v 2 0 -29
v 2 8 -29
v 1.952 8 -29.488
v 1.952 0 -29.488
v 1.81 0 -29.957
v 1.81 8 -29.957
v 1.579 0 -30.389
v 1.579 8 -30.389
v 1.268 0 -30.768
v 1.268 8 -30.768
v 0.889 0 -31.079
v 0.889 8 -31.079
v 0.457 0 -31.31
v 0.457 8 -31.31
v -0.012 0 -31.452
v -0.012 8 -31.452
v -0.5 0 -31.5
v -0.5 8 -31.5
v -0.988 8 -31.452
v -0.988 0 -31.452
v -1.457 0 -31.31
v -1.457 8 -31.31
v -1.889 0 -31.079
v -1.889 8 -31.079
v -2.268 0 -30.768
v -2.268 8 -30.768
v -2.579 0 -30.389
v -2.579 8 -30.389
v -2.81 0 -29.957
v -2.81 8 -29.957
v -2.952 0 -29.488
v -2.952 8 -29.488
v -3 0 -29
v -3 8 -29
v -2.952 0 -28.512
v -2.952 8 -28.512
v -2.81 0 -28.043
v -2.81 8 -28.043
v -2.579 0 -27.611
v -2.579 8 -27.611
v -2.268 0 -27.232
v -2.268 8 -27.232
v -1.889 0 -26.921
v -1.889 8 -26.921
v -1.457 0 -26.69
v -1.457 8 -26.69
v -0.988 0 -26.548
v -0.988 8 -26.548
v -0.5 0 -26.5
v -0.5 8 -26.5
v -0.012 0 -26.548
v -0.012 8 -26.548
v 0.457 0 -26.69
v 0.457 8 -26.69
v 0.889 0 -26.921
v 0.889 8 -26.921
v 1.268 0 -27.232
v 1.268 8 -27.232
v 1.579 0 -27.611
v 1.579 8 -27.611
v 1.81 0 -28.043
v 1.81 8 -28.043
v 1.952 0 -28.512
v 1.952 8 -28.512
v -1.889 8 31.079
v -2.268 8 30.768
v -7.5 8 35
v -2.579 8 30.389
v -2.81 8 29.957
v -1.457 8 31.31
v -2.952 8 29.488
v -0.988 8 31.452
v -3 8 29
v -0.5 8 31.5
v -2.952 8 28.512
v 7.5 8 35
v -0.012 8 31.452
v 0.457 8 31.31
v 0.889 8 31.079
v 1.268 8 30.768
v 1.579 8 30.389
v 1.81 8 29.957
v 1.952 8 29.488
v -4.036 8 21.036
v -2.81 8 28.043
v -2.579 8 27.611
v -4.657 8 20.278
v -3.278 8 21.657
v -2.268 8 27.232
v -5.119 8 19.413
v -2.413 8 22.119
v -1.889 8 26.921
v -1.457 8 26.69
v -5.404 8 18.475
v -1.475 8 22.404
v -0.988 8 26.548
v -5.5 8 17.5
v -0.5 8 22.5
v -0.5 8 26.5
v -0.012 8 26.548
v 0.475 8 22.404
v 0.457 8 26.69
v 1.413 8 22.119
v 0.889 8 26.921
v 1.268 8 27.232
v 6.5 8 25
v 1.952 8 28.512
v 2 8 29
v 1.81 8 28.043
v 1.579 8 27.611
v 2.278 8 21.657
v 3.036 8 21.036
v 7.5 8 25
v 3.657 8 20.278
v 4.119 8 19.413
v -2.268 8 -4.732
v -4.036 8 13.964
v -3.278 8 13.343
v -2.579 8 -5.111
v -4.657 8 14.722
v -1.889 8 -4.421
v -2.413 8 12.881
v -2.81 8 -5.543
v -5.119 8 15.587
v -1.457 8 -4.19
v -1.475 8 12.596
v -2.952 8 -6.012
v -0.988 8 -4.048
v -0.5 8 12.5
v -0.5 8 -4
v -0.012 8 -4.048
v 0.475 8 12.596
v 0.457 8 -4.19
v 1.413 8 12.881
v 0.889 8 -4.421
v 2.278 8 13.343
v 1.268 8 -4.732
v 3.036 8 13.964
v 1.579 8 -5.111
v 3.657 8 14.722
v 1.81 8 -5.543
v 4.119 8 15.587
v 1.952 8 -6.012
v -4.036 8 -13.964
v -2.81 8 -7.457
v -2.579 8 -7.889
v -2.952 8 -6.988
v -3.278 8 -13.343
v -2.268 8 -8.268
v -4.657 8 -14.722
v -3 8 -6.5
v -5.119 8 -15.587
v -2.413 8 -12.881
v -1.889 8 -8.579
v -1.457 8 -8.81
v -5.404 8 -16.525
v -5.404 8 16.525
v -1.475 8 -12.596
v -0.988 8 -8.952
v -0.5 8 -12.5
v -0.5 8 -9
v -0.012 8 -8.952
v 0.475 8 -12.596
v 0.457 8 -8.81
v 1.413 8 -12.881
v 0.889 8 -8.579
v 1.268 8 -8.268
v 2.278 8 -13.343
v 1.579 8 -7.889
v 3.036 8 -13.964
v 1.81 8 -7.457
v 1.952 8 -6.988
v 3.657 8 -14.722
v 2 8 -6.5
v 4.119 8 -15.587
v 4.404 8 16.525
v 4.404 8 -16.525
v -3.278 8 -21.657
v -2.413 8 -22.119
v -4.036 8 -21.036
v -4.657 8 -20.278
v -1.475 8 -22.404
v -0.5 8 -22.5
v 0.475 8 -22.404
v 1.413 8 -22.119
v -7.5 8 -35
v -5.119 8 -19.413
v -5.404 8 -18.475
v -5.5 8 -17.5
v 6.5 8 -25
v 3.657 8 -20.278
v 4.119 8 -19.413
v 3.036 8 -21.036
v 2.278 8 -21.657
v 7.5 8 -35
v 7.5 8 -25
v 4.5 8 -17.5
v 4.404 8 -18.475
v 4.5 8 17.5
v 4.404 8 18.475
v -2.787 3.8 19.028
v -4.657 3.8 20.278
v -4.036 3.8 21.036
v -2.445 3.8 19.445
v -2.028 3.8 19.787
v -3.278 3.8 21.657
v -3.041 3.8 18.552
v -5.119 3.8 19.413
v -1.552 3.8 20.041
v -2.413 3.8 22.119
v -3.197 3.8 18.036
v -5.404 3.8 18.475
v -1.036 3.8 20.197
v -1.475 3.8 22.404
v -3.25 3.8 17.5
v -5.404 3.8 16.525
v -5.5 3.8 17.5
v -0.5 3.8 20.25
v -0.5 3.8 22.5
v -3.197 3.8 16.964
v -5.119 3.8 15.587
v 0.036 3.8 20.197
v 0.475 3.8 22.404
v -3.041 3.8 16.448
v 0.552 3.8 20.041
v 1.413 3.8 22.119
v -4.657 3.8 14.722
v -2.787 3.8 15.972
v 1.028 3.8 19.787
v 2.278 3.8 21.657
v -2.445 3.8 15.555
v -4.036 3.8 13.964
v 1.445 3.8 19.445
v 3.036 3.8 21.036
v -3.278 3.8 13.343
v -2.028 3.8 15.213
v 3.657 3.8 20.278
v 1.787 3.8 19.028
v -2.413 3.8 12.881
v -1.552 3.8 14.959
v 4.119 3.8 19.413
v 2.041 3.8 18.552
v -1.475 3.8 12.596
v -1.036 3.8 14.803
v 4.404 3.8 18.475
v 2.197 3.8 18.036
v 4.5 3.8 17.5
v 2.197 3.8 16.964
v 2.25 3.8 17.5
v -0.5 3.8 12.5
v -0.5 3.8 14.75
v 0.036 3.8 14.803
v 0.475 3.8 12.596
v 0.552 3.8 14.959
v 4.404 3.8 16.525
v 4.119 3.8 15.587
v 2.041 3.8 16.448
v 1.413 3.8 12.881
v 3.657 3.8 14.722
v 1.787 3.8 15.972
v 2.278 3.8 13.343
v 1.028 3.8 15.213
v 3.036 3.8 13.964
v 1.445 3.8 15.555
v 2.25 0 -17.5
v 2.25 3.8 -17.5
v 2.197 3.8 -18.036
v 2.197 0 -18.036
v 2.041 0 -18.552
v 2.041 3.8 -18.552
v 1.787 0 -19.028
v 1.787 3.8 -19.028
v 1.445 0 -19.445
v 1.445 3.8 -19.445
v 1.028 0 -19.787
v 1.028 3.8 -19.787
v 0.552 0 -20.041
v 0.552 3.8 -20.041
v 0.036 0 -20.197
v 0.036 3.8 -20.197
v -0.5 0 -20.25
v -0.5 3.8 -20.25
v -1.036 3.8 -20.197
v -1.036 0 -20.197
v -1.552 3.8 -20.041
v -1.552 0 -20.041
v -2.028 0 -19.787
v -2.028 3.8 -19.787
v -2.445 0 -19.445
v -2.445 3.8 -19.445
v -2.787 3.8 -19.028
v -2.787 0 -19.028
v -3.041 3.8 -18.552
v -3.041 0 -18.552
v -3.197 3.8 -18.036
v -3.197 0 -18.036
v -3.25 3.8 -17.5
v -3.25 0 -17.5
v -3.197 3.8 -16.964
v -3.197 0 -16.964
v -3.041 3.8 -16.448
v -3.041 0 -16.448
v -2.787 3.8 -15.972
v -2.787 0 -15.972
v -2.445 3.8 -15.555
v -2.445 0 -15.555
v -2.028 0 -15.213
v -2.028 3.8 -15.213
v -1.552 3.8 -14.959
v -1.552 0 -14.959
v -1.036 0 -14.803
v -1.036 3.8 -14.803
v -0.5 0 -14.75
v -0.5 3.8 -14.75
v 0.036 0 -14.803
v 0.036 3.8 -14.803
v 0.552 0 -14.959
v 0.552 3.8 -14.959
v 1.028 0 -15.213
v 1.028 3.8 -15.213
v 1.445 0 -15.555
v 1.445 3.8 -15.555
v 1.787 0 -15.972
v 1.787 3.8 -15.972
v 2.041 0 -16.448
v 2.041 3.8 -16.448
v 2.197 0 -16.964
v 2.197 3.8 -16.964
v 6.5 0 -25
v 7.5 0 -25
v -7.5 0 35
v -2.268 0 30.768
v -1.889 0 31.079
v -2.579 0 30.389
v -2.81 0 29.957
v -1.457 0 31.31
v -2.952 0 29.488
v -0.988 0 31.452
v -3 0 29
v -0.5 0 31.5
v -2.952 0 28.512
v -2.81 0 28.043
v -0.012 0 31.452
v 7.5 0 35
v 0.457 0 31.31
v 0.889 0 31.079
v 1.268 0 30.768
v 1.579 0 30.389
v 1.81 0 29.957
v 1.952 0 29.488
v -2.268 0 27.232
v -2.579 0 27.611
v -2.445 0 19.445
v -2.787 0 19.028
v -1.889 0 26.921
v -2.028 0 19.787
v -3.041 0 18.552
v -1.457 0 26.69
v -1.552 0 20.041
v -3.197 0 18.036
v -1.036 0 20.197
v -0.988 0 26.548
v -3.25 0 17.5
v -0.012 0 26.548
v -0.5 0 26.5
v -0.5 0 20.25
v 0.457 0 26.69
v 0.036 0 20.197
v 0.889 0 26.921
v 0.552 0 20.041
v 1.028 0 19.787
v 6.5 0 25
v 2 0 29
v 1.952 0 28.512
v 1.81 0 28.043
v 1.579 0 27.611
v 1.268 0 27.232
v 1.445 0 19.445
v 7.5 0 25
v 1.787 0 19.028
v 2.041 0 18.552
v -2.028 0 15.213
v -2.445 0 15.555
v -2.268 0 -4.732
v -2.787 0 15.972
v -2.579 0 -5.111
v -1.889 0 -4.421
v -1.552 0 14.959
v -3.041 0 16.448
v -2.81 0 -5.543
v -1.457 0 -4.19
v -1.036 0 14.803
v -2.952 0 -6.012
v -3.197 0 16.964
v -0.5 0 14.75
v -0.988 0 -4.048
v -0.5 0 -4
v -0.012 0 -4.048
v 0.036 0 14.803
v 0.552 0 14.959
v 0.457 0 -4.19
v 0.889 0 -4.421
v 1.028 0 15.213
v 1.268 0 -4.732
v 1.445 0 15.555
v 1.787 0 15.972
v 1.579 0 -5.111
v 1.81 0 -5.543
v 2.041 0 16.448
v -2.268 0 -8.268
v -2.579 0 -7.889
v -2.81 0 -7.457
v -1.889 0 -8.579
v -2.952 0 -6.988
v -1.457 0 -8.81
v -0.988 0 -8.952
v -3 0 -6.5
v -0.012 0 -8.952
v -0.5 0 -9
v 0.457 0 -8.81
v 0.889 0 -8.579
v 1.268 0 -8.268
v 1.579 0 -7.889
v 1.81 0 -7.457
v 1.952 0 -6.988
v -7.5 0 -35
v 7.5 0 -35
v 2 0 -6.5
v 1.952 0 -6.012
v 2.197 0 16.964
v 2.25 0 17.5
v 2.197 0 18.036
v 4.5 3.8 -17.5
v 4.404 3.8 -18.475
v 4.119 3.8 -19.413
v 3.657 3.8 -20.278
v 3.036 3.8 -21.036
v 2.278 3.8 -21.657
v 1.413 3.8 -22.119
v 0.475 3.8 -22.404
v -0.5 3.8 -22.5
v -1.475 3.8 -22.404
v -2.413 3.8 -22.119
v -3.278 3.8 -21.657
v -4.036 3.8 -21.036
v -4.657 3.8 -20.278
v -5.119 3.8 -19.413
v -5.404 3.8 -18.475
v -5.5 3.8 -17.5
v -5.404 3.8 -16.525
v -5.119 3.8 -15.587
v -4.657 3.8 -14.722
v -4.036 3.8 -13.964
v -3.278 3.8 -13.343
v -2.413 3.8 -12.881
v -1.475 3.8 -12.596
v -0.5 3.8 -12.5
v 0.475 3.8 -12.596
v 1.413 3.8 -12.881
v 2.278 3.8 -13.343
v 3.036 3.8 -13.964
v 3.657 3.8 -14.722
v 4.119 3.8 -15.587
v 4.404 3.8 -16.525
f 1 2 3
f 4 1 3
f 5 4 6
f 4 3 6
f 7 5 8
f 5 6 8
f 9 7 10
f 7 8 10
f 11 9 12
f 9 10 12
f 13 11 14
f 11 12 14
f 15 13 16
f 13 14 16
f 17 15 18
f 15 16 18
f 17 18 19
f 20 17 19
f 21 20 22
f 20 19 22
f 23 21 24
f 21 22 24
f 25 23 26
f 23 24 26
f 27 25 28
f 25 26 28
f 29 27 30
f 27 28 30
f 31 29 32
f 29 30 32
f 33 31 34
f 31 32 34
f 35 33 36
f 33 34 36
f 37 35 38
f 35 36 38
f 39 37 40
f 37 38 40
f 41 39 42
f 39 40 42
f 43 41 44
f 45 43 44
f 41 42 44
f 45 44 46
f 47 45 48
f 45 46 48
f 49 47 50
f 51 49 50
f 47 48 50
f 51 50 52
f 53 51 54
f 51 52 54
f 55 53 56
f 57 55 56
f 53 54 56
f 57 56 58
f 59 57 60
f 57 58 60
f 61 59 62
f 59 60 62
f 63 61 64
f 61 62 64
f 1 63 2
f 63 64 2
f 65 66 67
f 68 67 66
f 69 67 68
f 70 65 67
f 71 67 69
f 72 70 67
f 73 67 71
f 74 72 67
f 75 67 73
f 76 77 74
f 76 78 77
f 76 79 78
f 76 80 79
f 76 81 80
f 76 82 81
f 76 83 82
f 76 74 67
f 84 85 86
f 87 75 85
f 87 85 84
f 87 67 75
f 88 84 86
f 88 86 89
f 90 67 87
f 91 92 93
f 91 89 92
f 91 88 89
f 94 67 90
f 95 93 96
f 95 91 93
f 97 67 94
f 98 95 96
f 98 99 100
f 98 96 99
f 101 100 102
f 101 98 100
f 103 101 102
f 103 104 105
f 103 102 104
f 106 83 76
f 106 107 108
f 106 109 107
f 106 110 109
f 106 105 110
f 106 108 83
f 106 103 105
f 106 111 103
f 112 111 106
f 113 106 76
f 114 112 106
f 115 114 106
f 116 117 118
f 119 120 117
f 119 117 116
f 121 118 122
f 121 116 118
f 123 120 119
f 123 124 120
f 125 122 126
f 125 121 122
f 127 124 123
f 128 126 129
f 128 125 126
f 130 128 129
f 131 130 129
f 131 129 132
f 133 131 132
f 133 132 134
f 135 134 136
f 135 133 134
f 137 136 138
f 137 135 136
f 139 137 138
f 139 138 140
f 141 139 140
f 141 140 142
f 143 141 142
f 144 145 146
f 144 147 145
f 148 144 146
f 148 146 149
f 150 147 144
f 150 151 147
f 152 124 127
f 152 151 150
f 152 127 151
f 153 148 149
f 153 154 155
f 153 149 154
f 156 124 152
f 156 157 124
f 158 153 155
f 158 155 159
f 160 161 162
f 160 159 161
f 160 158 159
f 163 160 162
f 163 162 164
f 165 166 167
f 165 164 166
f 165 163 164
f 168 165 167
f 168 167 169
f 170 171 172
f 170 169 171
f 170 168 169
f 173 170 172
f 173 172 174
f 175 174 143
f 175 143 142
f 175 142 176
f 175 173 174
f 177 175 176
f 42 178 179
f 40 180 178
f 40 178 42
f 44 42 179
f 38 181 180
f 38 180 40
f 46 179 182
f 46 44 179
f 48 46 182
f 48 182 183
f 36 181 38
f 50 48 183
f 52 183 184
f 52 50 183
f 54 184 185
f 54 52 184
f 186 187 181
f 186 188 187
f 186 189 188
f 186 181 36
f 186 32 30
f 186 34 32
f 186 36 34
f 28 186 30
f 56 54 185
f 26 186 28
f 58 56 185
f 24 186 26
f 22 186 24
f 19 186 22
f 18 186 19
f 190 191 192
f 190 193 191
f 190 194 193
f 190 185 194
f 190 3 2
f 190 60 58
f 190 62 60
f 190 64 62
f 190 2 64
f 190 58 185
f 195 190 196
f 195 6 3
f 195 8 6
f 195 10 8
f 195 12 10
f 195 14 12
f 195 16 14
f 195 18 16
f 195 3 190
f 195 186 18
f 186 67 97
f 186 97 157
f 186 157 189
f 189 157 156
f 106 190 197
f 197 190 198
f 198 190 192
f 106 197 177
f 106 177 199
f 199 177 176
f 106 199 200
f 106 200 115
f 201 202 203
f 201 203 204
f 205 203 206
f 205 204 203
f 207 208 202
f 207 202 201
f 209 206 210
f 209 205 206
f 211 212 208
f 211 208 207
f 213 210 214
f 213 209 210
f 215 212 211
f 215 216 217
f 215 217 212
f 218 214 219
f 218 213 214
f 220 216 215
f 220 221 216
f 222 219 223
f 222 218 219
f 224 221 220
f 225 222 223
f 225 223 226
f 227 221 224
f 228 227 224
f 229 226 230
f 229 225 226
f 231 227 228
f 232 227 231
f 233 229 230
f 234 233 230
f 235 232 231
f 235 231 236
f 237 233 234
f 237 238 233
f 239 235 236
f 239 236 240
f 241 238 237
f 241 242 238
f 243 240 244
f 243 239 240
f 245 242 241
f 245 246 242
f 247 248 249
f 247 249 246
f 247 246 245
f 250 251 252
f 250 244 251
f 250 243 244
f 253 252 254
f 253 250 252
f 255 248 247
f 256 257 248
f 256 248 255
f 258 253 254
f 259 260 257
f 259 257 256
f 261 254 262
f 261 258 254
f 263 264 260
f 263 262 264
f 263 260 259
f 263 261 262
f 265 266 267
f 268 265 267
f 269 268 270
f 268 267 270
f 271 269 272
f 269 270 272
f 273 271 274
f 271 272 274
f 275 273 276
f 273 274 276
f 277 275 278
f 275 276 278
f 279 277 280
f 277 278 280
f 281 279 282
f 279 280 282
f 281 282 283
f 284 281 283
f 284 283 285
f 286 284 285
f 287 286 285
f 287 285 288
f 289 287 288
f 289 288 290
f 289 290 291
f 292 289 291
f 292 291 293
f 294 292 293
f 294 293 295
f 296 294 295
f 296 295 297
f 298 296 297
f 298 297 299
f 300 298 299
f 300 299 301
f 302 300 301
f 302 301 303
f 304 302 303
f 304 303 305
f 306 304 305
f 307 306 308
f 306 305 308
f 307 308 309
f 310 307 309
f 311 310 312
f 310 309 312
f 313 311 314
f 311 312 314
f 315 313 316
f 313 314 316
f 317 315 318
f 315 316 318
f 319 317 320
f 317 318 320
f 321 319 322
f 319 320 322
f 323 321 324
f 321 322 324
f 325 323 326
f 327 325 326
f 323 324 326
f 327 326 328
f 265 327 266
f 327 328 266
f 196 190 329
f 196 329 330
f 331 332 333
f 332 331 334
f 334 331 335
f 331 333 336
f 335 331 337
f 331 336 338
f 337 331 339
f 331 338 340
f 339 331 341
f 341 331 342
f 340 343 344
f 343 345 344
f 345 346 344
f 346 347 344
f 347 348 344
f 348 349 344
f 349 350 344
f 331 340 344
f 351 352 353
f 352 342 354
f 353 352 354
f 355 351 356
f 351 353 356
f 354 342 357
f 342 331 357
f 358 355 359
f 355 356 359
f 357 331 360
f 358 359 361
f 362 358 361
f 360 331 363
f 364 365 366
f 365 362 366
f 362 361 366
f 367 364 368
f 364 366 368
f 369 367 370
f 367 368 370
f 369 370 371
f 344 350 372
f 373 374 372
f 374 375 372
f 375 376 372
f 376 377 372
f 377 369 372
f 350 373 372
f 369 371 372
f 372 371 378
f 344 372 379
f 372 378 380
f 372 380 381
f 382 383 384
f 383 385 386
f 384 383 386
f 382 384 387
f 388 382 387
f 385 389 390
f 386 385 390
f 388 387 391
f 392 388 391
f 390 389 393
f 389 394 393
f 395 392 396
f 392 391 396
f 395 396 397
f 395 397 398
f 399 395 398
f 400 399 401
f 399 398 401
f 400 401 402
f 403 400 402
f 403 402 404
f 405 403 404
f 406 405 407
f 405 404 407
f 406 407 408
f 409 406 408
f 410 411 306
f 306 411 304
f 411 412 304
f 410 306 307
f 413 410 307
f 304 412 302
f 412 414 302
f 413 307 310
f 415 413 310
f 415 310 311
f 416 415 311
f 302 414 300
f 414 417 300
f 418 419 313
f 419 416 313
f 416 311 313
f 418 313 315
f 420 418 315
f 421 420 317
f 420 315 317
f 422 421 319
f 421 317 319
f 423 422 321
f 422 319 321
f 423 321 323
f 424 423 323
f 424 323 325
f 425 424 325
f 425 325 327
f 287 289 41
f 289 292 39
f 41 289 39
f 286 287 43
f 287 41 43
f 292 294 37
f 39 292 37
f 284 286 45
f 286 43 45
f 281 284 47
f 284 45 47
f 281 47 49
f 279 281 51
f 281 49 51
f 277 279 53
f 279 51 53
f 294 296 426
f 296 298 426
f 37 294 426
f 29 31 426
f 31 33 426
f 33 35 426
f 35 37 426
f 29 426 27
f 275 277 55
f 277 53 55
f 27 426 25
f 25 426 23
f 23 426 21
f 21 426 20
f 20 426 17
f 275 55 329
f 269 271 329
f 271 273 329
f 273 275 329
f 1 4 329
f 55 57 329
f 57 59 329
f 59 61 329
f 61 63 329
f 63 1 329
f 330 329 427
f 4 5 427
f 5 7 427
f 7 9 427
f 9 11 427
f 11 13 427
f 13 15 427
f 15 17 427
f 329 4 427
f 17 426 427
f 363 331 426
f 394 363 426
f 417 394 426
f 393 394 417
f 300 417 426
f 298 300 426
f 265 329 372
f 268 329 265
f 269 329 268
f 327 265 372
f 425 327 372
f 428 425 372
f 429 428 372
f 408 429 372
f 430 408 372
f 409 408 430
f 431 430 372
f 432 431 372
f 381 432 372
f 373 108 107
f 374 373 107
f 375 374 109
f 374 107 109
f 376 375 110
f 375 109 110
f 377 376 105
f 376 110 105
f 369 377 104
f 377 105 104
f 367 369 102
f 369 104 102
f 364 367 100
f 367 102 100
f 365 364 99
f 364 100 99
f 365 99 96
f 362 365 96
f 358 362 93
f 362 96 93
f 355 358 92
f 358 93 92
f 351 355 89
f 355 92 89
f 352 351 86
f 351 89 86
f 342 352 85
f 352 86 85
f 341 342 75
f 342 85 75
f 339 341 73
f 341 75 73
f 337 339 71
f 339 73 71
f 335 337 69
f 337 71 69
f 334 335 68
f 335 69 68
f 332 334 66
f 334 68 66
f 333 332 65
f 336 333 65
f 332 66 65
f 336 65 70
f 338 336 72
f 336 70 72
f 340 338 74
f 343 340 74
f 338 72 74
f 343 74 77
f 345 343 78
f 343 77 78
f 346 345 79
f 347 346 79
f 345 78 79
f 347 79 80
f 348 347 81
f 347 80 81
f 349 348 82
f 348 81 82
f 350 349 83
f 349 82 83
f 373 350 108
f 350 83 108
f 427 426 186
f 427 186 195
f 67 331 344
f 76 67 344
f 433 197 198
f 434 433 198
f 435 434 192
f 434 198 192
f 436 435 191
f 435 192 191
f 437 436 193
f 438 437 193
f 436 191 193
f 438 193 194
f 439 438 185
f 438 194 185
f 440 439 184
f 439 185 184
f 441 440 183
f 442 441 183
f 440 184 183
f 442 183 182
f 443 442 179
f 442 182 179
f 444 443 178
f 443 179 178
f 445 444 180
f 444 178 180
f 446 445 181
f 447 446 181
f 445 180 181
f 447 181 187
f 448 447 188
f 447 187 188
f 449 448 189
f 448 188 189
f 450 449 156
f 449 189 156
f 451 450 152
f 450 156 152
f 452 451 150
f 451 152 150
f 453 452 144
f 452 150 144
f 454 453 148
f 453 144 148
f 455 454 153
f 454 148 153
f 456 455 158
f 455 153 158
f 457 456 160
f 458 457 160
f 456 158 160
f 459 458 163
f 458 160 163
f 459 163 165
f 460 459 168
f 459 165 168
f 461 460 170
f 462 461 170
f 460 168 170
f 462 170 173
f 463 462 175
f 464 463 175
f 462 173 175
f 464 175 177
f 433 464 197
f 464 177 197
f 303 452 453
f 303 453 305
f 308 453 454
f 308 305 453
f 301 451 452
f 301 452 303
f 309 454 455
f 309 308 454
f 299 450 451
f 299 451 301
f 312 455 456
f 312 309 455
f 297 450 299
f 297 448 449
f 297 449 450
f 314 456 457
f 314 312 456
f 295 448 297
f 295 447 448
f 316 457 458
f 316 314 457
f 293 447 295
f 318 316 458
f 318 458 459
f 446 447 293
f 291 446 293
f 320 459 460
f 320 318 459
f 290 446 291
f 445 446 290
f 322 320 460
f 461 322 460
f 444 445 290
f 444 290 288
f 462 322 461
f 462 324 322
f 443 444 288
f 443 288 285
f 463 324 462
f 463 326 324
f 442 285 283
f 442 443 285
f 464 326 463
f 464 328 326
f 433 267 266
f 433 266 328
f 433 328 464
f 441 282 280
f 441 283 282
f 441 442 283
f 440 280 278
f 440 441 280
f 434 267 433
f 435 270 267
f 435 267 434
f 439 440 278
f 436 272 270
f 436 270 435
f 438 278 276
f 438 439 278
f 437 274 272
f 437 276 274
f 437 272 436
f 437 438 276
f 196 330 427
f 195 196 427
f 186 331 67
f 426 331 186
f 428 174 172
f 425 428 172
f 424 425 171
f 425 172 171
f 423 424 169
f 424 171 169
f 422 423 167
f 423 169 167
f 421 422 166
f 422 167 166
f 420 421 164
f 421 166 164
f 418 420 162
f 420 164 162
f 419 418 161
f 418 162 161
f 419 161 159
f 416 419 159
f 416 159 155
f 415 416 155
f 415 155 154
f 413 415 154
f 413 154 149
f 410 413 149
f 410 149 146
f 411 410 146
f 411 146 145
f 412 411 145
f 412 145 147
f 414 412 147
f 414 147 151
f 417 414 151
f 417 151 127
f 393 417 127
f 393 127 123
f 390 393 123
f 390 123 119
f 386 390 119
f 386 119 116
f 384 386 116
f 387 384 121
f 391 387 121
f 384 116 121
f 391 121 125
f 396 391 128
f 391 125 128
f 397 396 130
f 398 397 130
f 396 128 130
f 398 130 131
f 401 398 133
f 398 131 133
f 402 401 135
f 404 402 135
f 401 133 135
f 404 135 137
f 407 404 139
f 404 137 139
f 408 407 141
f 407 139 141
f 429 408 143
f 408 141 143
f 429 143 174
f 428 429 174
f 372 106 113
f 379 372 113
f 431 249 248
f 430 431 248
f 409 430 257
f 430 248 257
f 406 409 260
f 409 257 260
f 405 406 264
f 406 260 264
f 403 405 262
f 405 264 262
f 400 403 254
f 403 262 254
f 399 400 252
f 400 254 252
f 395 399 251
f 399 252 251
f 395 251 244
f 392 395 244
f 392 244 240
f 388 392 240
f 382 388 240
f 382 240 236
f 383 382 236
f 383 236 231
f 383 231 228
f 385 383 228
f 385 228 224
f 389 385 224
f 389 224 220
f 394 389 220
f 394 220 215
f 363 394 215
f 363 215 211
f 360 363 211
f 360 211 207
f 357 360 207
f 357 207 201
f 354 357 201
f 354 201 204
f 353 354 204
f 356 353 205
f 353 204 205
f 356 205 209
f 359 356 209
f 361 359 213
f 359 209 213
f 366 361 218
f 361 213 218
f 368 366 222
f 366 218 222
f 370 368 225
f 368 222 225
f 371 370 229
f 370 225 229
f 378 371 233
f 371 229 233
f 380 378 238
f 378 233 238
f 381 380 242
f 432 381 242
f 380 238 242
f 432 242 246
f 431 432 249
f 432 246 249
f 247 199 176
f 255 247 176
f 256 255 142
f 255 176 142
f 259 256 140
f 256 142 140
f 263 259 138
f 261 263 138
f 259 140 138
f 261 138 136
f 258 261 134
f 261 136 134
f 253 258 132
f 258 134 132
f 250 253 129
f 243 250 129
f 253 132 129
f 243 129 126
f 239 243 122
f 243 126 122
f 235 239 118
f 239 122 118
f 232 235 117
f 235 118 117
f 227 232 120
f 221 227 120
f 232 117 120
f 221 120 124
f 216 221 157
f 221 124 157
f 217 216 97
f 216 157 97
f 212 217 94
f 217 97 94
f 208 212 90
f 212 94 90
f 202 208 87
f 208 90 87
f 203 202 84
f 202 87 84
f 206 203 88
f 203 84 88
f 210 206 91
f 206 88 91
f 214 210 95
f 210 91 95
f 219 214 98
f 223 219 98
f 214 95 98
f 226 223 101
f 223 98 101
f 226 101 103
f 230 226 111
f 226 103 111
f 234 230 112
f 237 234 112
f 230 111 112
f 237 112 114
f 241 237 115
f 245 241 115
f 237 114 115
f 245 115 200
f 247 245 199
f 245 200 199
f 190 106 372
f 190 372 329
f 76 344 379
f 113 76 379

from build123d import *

# Parameters (mm, degrees)
SKETCH1_W           = 15
SKETCH1_H           = 70
BOSS_EXTRUDE1_DEPTH = 8
SKETCH2_W           = 1
SKETCH2_H           = 50
CUT_EXTRUDE1_DEPTH  = 8
SKETCH3_R           = 2.5
CUT_EXTRUDE2_DEPTH  = 8
SKETCH4_R           = 2.75
CUT_EXTRUDE3_DEPTH  = 8
SKETCH5_R           = 5
CUT_EXTRUDE4_DEPTH  = 4.2
SKETCH6_R           = 2.5
CUT_EXTRUDE5_DEPTH  = 72.2


with BuildPart() as part:
    # Sketch1 → Boss-Extrude1 (new body)
    with BuildSketch(Plane(origin=(0, 0, 0), x_dir=(1, 0, 0), z_dir=(0, 1, 0))):
        Rectangle(SKETCH1_W, SKETCH1_H)
    extrude(amount=BOSS_EXTRUDE1_DEPTH)

    # Sketch2 → Cut-Extrude1 (cut)
    with BuildSketch(Plane(origin=(0, 8, 0), x_dir=(1, 0, 0), z_dir=(0, 1, 0))):
        with Locations((7, 0)):
            Rectangle(SKETCH2_W, SKETCH2_H)
    extrude(amount=-CUT_EXTRUDE1_DEPTH, mode=Mode.SUBTRACT)

    # Sketch3 → Cut-Extrude2 (cut)
    with BuildSketch(Plane(origin=(0, 8, 0), x_dir=(1, 0, 0), z_dir=(0, 1, 0))):
        with Locations((-0.5, -29)):
            Circle(SKETCH3_R)
        with Locations((-0.5, 29)):
            Circle(SKETCH3_R)
    extrude(amount=-CUT_EXTRUDE2_DEPTH, mode=Mode.SUBTRACT)

    # Sketch4 → Cut-Extrude3 (cut)
    with BuildSketch(Plane(origin=(0, 8, 0), x_dir=(1, 0, 0), z_dir=(0, 1, 0))):
        with Locations((-0.5, -17.5)):
            Circle(SKETCH4_R)
        with Locations((-0.5, 17.5)):
            Circle(SKETCH4_R)
    extrude(amount=-CUT_EXTRUDE3_DEPTH, mode=Mode.SUBTRACT)

    # Sketch5 → Cut-Extrude4 (cut)
    with BuildSketch(Plane(origin=(0, 8, 0), x_dir=(1, 0, 0), z_dir=(0, 1, 0))):
        with Locations((-0.5, 17.5)):
            Circle(SKETCH5_R)
        with Locations((-0.5, -17.5)):
            Circle(SKETCH5_R)
    extrude(amount=-CUT_EXTRUDE4_DEPTH, mode=Mode.SUBTRACT)

    # Sketch6 → Cut-Extrude5 (cut)
    with BuildSketch(Plane(origin=(0, 8, 0), x_dir=(1, 0, 0), z_dir=(0, 1, 0))):
        with Locations((-0.5, 6.5)):
            Circle(SKETCH6_R)
    extrude(amount=-CUT_EXTRUDE5_DEPTH, mode=Mode.SUBTRACT)


solid = part.part
